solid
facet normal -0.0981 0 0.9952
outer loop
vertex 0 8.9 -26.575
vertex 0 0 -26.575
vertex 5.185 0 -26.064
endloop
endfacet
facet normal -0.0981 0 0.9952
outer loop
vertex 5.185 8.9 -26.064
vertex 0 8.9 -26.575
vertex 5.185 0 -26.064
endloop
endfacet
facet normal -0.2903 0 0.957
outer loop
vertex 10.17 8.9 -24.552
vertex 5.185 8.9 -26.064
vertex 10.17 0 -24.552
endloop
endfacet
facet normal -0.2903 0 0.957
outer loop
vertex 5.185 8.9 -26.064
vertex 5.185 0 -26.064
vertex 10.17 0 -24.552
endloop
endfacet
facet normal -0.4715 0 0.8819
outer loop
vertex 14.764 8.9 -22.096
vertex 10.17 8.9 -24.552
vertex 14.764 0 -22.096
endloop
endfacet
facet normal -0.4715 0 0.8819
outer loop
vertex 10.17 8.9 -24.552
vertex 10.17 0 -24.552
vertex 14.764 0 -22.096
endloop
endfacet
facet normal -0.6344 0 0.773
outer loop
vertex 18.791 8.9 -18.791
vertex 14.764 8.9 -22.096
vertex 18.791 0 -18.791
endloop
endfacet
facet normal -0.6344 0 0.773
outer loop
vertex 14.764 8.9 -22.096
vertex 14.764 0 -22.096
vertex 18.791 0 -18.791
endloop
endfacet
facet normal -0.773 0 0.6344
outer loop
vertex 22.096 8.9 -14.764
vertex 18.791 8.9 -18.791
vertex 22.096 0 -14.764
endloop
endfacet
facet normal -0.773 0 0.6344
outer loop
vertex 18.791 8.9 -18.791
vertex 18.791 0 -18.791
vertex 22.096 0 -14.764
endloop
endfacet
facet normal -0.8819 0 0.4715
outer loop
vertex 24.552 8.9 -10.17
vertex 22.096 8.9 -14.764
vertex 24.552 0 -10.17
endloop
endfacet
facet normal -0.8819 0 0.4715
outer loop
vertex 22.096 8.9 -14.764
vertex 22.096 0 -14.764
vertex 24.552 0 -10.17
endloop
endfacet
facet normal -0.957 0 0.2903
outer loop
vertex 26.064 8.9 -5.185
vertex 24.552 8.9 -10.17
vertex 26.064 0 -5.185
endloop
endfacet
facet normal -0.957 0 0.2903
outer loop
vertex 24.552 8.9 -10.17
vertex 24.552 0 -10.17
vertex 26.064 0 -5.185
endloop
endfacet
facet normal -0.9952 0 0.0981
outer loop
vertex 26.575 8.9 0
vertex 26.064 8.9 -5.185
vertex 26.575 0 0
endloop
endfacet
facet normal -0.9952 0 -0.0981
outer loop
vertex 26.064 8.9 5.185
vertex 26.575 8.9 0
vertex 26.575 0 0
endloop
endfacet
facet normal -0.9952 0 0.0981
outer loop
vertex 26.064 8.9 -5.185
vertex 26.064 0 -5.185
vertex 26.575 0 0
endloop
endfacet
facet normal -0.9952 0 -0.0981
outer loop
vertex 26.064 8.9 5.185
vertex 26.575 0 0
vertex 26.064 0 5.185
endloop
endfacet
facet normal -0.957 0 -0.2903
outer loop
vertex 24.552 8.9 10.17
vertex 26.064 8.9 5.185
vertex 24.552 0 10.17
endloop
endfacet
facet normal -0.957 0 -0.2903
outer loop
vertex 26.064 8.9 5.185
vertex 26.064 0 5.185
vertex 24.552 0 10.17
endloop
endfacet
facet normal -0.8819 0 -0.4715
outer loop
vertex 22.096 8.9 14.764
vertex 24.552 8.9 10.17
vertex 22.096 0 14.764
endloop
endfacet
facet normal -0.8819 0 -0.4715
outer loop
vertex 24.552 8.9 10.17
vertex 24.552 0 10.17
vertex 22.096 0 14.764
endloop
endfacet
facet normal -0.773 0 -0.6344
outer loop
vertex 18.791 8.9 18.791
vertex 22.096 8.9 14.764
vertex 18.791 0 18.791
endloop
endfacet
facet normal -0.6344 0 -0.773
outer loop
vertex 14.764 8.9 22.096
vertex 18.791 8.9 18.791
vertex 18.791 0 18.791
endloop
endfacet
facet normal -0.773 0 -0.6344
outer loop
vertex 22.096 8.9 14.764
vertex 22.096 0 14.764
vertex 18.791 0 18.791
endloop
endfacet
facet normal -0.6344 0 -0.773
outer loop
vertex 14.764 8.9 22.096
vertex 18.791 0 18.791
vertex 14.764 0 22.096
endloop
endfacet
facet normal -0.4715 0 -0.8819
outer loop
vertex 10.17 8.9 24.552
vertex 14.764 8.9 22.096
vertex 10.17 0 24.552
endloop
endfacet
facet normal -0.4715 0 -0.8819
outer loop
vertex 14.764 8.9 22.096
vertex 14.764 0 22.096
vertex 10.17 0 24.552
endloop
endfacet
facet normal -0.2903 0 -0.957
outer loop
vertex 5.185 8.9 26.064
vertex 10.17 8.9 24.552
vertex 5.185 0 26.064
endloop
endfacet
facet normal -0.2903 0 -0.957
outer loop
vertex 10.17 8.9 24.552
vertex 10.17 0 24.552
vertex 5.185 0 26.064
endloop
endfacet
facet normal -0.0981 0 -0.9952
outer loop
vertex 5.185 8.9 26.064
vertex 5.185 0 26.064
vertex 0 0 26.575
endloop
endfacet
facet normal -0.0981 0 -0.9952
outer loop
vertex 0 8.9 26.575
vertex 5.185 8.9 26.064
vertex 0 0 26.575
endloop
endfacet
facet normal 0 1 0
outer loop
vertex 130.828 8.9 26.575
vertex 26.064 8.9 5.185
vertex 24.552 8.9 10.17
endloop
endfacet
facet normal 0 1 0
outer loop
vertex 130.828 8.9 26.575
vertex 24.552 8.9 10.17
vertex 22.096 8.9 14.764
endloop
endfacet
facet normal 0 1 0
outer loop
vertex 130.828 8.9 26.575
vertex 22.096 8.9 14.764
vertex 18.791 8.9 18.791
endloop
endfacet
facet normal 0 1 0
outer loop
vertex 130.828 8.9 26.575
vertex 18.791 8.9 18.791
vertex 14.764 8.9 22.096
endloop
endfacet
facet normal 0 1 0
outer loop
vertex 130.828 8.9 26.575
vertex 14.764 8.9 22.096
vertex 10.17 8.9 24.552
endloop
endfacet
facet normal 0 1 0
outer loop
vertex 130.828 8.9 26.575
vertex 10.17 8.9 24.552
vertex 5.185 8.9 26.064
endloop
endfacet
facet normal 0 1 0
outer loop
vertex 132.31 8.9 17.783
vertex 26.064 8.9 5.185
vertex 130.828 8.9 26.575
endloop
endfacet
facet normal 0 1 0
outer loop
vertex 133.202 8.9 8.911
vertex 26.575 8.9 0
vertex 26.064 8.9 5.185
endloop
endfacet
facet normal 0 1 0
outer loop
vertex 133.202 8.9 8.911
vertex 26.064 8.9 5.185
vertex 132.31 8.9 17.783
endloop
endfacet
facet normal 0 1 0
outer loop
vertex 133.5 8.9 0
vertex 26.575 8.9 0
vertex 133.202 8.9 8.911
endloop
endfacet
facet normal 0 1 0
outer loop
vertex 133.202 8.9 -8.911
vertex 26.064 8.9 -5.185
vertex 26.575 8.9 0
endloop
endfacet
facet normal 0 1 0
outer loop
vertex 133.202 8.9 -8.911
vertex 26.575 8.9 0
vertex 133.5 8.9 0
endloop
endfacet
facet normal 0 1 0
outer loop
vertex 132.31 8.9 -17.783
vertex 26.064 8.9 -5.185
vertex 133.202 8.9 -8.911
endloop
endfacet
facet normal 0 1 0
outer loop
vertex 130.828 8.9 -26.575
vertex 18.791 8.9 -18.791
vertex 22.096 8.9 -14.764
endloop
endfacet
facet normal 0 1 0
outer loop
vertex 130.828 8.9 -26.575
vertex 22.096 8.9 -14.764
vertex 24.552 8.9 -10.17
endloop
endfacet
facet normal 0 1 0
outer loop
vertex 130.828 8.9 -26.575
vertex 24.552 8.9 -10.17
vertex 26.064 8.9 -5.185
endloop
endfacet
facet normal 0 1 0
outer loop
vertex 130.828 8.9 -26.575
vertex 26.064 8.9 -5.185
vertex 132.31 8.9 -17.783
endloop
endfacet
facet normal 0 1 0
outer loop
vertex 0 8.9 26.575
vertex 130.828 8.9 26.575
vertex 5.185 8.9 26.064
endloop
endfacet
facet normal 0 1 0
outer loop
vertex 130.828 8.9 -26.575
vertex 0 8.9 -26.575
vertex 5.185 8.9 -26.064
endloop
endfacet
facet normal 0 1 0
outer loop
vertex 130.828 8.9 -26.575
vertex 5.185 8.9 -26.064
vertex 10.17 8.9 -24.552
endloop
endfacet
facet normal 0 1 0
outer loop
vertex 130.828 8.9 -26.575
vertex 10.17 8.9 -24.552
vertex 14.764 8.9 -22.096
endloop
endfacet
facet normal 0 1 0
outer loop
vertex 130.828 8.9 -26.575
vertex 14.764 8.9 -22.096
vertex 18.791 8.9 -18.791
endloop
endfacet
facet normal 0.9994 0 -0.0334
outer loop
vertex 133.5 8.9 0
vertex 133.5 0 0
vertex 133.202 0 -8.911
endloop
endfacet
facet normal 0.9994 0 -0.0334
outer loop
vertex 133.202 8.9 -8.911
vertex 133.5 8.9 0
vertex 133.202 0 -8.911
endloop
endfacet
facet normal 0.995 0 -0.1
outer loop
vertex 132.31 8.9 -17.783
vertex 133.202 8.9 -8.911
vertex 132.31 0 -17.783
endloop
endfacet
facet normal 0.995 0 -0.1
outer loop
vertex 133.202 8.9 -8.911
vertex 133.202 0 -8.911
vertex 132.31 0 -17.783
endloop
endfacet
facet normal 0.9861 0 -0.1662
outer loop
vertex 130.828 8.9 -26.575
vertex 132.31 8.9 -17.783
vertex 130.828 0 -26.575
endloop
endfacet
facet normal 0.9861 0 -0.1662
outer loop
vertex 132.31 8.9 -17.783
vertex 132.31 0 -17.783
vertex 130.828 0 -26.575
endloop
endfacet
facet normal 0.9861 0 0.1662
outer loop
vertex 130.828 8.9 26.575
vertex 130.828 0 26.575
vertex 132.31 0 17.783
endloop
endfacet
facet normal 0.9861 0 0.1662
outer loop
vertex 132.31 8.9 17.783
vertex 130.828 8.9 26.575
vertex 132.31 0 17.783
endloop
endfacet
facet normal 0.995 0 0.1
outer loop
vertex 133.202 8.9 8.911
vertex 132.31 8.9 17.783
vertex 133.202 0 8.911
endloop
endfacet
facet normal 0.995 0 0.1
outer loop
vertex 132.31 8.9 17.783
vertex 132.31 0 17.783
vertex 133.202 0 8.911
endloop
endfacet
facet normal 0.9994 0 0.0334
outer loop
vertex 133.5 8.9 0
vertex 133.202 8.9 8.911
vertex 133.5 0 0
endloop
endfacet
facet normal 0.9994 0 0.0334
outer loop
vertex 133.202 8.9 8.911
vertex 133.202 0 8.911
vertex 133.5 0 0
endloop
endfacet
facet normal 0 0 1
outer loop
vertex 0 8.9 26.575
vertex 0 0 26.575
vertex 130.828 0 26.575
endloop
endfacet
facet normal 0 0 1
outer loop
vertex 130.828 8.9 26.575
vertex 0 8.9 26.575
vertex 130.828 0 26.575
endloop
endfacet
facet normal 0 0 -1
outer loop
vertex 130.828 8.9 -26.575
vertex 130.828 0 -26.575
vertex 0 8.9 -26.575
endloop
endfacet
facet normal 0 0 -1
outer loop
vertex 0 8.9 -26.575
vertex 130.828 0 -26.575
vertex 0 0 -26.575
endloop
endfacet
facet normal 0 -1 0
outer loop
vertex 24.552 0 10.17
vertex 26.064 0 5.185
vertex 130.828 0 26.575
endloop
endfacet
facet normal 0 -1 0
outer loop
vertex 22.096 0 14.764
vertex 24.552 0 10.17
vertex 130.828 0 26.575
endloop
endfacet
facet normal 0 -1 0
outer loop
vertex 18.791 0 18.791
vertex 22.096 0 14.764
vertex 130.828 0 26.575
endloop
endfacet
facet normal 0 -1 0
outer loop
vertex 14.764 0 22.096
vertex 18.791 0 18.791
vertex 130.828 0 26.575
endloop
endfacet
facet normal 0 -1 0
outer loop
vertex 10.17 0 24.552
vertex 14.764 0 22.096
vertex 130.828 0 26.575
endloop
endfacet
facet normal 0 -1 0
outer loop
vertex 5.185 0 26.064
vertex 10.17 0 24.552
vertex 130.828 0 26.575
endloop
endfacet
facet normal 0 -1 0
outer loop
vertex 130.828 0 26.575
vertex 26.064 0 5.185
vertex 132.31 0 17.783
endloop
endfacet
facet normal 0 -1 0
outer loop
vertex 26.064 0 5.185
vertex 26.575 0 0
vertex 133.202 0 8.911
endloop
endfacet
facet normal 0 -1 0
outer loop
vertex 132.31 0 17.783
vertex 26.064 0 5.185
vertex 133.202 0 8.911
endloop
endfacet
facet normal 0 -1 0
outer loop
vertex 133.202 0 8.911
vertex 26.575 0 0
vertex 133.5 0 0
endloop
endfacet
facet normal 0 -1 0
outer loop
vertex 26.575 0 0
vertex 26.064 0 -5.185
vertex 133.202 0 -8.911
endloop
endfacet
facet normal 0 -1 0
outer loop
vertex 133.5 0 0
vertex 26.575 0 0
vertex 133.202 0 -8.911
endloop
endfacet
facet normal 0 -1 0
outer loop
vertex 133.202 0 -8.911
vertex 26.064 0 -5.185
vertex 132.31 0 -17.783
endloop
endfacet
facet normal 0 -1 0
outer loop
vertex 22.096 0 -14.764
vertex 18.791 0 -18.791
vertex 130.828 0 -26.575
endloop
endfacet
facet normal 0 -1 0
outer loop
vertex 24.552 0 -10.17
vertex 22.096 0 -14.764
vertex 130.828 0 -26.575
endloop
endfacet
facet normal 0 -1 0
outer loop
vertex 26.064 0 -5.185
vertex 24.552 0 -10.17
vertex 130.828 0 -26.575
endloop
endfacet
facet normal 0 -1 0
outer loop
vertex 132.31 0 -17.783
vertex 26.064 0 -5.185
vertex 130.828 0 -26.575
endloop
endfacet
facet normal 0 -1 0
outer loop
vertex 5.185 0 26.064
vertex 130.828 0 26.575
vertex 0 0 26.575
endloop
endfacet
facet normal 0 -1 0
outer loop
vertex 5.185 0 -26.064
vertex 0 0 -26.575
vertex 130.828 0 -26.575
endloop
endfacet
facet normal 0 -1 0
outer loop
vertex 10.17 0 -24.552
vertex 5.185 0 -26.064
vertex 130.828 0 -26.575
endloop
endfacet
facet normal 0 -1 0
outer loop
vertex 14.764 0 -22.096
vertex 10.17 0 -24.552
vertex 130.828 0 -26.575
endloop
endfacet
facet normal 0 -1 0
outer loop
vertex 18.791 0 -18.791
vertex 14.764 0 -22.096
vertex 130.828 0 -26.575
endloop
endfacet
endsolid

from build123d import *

# Parameters (mm, degrees)
BOSS_EXTRUDE1_DEPTH = 8.9


with BuildPart() as part:
    # Sketch1 → Boss-Extrude1 (new body)
    with BuildSketch(Plane(origin=(0, 0, 0), x_dir=(1, 0, 0), z_dir=(0, 1, 0))):
        with BuildLine():
            Line((0, -26.575), (130.828205579, -26.575))
            ThreePointArc((130.828205579, -26.575), (132.830371988, -13.354485299), (133.5, 0))
            ThreePointArc((133.5, 0), (132.830371988, 13.354485299), (130.828205579, 26.575))
            Line((130.828205579, 26.575), (0, 26.575))
            ThreePointArc((0, 26.575), (26.575, 0), (0, -26.575))
        make_face()
    extrude(amount=BOSS_EXTRUDE1_DEPTH)


solid = part.part
